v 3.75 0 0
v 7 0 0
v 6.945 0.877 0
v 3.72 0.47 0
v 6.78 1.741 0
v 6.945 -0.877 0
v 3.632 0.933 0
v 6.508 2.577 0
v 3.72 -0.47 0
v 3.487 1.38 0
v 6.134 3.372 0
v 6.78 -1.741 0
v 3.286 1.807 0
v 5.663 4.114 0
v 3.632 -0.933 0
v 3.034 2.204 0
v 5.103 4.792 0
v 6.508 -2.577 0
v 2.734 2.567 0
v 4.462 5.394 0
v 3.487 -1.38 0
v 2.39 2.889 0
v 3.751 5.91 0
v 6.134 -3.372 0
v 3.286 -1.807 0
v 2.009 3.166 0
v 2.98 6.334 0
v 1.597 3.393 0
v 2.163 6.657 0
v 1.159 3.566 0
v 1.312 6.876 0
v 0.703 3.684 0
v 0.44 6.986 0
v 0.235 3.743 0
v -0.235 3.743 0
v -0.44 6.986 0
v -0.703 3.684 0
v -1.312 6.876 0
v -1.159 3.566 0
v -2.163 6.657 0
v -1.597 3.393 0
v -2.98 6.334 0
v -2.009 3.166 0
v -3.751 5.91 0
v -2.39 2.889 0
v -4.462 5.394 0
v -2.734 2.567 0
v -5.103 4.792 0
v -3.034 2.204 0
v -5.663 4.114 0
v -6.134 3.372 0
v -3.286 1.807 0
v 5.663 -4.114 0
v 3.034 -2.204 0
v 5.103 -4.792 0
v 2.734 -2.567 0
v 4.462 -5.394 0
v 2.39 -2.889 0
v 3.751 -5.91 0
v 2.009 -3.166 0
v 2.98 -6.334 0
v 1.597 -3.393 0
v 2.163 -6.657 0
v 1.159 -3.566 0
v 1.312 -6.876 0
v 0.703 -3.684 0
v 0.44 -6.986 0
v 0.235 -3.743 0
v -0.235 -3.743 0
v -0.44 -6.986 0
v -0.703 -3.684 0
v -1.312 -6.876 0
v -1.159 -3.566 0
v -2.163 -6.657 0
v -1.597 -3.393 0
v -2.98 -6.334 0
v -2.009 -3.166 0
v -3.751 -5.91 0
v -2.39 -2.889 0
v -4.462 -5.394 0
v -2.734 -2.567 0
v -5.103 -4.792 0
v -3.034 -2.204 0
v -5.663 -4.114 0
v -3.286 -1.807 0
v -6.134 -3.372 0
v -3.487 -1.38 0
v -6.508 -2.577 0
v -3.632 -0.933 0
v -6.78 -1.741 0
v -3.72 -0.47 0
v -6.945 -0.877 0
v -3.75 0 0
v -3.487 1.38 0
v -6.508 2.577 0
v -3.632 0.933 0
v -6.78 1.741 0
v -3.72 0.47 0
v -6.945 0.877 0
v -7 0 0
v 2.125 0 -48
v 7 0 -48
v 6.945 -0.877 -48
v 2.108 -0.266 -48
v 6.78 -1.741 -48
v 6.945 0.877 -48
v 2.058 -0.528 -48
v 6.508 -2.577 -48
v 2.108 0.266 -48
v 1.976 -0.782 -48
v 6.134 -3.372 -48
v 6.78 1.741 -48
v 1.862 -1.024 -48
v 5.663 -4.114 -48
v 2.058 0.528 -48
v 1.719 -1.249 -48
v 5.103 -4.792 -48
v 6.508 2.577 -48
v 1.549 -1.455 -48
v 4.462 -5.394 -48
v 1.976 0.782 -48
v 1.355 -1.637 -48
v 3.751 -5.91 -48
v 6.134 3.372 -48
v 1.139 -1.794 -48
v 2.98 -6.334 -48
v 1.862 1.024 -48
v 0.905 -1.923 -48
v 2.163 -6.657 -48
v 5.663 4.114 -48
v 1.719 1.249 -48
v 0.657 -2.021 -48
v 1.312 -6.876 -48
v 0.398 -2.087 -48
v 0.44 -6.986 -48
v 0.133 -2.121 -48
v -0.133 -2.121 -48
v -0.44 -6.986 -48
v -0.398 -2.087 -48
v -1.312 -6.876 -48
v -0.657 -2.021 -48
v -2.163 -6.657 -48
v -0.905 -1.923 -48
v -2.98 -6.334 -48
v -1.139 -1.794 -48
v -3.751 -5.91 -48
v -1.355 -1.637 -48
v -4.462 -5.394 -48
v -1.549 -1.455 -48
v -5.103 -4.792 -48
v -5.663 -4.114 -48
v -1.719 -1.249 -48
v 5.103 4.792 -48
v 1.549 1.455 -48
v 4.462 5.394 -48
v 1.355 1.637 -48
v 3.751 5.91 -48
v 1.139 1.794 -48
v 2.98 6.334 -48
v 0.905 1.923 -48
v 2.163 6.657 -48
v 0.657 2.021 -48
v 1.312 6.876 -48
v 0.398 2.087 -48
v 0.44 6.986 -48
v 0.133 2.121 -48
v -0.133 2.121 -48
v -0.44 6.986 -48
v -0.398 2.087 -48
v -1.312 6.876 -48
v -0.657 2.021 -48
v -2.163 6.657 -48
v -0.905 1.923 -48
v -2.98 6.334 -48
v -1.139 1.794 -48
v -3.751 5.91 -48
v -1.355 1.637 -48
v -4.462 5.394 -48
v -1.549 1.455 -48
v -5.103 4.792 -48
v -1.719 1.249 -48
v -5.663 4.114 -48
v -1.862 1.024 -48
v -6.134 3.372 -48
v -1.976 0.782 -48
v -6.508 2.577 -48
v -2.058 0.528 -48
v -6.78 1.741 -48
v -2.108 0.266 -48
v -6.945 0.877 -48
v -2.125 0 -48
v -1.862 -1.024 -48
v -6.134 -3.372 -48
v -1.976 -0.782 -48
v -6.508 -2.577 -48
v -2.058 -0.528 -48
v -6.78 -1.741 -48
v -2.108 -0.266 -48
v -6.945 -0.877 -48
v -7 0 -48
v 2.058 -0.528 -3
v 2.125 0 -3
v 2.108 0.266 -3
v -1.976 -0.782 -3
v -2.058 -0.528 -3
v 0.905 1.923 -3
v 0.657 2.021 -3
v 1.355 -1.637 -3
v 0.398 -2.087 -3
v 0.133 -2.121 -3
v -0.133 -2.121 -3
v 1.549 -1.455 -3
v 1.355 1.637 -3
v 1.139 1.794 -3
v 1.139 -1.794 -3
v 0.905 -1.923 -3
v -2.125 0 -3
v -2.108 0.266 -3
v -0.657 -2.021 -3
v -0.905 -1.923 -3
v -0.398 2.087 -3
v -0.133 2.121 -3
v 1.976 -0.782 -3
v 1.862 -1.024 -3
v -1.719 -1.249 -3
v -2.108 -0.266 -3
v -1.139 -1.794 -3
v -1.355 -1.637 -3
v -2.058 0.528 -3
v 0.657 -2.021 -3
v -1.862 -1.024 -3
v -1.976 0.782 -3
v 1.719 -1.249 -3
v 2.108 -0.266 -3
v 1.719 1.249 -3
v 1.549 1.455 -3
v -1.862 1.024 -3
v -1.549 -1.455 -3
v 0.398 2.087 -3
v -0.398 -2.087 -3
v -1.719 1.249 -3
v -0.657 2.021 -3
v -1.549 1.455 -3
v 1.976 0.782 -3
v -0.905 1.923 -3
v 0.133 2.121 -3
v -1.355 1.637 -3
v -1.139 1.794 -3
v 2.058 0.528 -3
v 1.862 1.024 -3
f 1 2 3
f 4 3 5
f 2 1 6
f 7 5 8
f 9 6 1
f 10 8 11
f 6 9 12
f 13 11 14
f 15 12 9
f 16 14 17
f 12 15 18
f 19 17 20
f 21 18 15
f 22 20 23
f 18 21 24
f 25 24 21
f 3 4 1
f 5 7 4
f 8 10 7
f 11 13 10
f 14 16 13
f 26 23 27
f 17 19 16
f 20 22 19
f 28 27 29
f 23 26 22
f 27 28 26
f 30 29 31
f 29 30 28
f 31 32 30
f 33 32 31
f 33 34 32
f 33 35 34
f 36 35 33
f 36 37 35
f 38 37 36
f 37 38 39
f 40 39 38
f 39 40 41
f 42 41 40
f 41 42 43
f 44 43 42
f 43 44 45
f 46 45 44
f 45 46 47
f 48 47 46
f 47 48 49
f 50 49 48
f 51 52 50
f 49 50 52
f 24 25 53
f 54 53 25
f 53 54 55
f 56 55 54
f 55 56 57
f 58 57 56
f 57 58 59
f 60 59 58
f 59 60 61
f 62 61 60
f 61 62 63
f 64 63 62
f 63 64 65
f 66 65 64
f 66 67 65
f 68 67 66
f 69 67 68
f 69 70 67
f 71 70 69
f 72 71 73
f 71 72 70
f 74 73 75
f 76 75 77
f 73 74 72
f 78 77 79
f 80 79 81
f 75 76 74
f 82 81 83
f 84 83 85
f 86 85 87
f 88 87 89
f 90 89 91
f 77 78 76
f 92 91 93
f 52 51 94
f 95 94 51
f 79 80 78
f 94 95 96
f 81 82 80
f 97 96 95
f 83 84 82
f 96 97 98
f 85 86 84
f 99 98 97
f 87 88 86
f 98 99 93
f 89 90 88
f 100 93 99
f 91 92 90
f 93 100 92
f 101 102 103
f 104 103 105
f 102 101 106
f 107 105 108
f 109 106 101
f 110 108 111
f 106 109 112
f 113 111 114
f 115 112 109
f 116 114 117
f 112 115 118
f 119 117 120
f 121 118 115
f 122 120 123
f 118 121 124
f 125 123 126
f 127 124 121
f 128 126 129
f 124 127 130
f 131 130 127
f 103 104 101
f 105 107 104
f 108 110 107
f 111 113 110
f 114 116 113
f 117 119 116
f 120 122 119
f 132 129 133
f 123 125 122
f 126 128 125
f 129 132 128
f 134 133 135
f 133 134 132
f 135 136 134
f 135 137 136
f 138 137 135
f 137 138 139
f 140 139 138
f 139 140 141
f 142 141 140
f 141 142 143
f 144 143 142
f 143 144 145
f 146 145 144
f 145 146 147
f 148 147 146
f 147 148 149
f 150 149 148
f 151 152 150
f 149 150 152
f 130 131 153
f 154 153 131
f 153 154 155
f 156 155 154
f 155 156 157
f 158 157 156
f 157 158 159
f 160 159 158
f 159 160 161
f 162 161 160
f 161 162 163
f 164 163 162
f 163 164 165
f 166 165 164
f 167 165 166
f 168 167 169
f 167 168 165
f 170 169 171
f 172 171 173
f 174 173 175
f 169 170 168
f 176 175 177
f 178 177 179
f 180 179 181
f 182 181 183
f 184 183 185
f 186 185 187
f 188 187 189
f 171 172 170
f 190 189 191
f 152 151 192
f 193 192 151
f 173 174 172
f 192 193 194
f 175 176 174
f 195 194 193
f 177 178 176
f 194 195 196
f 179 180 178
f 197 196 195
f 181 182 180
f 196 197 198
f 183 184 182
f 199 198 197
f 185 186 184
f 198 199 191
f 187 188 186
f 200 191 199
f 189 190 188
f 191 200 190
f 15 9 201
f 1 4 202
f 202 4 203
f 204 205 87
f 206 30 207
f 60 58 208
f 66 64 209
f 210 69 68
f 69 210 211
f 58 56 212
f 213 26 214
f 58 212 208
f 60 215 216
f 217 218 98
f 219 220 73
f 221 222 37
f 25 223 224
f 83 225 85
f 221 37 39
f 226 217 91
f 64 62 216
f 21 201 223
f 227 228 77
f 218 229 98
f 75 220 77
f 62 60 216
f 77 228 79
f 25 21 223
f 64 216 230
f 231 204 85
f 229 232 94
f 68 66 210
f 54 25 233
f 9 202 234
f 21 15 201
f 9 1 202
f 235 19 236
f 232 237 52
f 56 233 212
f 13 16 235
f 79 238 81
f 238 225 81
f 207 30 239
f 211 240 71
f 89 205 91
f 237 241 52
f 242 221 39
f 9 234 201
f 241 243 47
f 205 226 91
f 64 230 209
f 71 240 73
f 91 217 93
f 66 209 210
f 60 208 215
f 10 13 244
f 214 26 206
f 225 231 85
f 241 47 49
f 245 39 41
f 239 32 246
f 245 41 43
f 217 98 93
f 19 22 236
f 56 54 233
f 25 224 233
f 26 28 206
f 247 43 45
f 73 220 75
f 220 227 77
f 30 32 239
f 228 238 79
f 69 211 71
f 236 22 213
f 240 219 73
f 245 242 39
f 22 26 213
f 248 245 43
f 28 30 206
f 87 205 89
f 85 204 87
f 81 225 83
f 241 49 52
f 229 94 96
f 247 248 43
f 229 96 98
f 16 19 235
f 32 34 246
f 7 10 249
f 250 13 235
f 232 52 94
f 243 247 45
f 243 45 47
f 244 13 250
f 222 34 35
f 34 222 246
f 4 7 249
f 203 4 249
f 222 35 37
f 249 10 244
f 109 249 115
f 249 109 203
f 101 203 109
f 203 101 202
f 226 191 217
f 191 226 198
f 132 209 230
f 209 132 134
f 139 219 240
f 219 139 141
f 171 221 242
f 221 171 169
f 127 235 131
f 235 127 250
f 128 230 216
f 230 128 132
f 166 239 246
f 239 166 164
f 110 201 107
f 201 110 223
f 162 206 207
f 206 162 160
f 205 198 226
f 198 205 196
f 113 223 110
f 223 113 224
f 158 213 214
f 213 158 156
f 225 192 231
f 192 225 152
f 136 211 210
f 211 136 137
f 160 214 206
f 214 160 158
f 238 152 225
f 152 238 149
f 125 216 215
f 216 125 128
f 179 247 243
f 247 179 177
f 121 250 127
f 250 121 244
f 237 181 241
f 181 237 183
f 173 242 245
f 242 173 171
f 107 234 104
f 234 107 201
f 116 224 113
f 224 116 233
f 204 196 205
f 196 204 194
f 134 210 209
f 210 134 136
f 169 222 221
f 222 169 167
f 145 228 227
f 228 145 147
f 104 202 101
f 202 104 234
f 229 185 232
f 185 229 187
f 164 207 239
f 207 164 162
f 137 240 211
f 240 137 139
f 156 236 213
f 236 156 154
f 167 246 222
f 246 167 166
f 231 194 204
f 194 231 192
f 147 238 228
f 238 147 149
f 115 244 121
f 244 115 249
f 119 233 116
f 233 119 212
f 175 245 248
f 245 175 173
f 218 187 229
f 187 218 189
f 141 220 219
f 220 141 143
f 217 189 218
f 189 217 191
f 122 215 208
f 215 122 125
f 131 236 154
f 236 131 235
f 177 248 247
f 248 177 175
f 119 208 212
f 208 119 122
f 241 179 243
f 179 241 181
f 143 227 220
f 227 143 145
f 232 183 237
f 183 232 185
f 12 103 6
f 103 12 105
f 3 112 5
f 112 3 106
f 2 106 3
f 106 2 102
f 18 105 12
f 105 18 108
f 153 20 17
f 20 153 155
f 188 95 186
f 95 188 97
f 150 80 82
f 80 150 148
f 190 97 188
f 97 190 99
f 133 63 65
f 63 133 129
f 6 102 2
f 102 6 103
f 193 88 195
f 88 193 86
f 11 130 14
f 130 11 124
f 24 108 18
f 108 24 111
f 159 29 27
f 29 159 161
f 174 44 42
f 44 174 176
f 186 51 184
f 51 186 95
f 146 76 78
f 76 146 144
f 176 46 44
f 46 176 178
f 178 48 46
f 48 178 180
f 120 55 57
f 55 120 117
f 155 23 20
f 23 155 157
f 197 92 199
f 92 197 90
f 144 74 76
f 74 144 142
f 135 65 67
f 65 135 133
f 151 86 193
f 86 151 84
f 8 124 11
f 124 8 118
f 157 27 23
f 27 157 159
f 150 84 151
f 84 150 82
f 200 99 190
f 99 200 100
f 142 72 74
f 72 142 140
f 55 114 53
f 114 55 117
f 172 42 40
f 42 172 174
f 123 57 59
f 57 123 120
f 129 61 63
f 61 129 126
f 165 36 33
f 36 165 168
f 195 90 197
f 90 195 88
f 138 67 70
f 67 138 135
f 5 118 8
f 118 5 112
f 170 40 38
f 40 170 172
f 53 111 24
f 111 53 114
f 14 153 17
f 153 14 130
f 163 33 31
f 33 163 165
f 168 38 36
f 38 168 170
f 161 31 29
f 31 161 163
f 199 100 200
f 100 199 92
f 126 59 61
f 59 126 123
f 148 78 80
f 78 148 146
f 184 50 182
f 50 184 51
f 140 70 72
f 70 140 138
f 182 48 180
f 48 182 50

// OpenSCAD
$fn = 50;


difference() {
	union() {
		translate(v = [0, 0, -48.0000000000]) {
			cylinder(h = 48, r = 7.0000000000);
		}
		cylinder(h = 0, r = 13.0000000000);
	}
	union() {
		translate(v = [0, 0, 0]) {
			rotate(a = [0, 0, 0]) {
				difference() {
					union() {
						#translate(v = [0, 0, -48.0000000000]) {
							cylinder(h = 48, r = 2.0000000000);
						}
						#translate(v = [0, 0, -3]) {
							cylinder(h = 3, r = 7.0000000000, r1 = 2.1250000000, r2 = 3.7500000000);
						}
						#translate(v = [0, 0, -48.0000000000]) {
							cylinder(h = 48, r = 2.1250000000);
						}
						#translate(v = [0, 0, -48.0000000000]) {
							cylinder(h = 48, r = 2.0000000000);
						}
					}
					union();
				}
			}
		}
	}
}
